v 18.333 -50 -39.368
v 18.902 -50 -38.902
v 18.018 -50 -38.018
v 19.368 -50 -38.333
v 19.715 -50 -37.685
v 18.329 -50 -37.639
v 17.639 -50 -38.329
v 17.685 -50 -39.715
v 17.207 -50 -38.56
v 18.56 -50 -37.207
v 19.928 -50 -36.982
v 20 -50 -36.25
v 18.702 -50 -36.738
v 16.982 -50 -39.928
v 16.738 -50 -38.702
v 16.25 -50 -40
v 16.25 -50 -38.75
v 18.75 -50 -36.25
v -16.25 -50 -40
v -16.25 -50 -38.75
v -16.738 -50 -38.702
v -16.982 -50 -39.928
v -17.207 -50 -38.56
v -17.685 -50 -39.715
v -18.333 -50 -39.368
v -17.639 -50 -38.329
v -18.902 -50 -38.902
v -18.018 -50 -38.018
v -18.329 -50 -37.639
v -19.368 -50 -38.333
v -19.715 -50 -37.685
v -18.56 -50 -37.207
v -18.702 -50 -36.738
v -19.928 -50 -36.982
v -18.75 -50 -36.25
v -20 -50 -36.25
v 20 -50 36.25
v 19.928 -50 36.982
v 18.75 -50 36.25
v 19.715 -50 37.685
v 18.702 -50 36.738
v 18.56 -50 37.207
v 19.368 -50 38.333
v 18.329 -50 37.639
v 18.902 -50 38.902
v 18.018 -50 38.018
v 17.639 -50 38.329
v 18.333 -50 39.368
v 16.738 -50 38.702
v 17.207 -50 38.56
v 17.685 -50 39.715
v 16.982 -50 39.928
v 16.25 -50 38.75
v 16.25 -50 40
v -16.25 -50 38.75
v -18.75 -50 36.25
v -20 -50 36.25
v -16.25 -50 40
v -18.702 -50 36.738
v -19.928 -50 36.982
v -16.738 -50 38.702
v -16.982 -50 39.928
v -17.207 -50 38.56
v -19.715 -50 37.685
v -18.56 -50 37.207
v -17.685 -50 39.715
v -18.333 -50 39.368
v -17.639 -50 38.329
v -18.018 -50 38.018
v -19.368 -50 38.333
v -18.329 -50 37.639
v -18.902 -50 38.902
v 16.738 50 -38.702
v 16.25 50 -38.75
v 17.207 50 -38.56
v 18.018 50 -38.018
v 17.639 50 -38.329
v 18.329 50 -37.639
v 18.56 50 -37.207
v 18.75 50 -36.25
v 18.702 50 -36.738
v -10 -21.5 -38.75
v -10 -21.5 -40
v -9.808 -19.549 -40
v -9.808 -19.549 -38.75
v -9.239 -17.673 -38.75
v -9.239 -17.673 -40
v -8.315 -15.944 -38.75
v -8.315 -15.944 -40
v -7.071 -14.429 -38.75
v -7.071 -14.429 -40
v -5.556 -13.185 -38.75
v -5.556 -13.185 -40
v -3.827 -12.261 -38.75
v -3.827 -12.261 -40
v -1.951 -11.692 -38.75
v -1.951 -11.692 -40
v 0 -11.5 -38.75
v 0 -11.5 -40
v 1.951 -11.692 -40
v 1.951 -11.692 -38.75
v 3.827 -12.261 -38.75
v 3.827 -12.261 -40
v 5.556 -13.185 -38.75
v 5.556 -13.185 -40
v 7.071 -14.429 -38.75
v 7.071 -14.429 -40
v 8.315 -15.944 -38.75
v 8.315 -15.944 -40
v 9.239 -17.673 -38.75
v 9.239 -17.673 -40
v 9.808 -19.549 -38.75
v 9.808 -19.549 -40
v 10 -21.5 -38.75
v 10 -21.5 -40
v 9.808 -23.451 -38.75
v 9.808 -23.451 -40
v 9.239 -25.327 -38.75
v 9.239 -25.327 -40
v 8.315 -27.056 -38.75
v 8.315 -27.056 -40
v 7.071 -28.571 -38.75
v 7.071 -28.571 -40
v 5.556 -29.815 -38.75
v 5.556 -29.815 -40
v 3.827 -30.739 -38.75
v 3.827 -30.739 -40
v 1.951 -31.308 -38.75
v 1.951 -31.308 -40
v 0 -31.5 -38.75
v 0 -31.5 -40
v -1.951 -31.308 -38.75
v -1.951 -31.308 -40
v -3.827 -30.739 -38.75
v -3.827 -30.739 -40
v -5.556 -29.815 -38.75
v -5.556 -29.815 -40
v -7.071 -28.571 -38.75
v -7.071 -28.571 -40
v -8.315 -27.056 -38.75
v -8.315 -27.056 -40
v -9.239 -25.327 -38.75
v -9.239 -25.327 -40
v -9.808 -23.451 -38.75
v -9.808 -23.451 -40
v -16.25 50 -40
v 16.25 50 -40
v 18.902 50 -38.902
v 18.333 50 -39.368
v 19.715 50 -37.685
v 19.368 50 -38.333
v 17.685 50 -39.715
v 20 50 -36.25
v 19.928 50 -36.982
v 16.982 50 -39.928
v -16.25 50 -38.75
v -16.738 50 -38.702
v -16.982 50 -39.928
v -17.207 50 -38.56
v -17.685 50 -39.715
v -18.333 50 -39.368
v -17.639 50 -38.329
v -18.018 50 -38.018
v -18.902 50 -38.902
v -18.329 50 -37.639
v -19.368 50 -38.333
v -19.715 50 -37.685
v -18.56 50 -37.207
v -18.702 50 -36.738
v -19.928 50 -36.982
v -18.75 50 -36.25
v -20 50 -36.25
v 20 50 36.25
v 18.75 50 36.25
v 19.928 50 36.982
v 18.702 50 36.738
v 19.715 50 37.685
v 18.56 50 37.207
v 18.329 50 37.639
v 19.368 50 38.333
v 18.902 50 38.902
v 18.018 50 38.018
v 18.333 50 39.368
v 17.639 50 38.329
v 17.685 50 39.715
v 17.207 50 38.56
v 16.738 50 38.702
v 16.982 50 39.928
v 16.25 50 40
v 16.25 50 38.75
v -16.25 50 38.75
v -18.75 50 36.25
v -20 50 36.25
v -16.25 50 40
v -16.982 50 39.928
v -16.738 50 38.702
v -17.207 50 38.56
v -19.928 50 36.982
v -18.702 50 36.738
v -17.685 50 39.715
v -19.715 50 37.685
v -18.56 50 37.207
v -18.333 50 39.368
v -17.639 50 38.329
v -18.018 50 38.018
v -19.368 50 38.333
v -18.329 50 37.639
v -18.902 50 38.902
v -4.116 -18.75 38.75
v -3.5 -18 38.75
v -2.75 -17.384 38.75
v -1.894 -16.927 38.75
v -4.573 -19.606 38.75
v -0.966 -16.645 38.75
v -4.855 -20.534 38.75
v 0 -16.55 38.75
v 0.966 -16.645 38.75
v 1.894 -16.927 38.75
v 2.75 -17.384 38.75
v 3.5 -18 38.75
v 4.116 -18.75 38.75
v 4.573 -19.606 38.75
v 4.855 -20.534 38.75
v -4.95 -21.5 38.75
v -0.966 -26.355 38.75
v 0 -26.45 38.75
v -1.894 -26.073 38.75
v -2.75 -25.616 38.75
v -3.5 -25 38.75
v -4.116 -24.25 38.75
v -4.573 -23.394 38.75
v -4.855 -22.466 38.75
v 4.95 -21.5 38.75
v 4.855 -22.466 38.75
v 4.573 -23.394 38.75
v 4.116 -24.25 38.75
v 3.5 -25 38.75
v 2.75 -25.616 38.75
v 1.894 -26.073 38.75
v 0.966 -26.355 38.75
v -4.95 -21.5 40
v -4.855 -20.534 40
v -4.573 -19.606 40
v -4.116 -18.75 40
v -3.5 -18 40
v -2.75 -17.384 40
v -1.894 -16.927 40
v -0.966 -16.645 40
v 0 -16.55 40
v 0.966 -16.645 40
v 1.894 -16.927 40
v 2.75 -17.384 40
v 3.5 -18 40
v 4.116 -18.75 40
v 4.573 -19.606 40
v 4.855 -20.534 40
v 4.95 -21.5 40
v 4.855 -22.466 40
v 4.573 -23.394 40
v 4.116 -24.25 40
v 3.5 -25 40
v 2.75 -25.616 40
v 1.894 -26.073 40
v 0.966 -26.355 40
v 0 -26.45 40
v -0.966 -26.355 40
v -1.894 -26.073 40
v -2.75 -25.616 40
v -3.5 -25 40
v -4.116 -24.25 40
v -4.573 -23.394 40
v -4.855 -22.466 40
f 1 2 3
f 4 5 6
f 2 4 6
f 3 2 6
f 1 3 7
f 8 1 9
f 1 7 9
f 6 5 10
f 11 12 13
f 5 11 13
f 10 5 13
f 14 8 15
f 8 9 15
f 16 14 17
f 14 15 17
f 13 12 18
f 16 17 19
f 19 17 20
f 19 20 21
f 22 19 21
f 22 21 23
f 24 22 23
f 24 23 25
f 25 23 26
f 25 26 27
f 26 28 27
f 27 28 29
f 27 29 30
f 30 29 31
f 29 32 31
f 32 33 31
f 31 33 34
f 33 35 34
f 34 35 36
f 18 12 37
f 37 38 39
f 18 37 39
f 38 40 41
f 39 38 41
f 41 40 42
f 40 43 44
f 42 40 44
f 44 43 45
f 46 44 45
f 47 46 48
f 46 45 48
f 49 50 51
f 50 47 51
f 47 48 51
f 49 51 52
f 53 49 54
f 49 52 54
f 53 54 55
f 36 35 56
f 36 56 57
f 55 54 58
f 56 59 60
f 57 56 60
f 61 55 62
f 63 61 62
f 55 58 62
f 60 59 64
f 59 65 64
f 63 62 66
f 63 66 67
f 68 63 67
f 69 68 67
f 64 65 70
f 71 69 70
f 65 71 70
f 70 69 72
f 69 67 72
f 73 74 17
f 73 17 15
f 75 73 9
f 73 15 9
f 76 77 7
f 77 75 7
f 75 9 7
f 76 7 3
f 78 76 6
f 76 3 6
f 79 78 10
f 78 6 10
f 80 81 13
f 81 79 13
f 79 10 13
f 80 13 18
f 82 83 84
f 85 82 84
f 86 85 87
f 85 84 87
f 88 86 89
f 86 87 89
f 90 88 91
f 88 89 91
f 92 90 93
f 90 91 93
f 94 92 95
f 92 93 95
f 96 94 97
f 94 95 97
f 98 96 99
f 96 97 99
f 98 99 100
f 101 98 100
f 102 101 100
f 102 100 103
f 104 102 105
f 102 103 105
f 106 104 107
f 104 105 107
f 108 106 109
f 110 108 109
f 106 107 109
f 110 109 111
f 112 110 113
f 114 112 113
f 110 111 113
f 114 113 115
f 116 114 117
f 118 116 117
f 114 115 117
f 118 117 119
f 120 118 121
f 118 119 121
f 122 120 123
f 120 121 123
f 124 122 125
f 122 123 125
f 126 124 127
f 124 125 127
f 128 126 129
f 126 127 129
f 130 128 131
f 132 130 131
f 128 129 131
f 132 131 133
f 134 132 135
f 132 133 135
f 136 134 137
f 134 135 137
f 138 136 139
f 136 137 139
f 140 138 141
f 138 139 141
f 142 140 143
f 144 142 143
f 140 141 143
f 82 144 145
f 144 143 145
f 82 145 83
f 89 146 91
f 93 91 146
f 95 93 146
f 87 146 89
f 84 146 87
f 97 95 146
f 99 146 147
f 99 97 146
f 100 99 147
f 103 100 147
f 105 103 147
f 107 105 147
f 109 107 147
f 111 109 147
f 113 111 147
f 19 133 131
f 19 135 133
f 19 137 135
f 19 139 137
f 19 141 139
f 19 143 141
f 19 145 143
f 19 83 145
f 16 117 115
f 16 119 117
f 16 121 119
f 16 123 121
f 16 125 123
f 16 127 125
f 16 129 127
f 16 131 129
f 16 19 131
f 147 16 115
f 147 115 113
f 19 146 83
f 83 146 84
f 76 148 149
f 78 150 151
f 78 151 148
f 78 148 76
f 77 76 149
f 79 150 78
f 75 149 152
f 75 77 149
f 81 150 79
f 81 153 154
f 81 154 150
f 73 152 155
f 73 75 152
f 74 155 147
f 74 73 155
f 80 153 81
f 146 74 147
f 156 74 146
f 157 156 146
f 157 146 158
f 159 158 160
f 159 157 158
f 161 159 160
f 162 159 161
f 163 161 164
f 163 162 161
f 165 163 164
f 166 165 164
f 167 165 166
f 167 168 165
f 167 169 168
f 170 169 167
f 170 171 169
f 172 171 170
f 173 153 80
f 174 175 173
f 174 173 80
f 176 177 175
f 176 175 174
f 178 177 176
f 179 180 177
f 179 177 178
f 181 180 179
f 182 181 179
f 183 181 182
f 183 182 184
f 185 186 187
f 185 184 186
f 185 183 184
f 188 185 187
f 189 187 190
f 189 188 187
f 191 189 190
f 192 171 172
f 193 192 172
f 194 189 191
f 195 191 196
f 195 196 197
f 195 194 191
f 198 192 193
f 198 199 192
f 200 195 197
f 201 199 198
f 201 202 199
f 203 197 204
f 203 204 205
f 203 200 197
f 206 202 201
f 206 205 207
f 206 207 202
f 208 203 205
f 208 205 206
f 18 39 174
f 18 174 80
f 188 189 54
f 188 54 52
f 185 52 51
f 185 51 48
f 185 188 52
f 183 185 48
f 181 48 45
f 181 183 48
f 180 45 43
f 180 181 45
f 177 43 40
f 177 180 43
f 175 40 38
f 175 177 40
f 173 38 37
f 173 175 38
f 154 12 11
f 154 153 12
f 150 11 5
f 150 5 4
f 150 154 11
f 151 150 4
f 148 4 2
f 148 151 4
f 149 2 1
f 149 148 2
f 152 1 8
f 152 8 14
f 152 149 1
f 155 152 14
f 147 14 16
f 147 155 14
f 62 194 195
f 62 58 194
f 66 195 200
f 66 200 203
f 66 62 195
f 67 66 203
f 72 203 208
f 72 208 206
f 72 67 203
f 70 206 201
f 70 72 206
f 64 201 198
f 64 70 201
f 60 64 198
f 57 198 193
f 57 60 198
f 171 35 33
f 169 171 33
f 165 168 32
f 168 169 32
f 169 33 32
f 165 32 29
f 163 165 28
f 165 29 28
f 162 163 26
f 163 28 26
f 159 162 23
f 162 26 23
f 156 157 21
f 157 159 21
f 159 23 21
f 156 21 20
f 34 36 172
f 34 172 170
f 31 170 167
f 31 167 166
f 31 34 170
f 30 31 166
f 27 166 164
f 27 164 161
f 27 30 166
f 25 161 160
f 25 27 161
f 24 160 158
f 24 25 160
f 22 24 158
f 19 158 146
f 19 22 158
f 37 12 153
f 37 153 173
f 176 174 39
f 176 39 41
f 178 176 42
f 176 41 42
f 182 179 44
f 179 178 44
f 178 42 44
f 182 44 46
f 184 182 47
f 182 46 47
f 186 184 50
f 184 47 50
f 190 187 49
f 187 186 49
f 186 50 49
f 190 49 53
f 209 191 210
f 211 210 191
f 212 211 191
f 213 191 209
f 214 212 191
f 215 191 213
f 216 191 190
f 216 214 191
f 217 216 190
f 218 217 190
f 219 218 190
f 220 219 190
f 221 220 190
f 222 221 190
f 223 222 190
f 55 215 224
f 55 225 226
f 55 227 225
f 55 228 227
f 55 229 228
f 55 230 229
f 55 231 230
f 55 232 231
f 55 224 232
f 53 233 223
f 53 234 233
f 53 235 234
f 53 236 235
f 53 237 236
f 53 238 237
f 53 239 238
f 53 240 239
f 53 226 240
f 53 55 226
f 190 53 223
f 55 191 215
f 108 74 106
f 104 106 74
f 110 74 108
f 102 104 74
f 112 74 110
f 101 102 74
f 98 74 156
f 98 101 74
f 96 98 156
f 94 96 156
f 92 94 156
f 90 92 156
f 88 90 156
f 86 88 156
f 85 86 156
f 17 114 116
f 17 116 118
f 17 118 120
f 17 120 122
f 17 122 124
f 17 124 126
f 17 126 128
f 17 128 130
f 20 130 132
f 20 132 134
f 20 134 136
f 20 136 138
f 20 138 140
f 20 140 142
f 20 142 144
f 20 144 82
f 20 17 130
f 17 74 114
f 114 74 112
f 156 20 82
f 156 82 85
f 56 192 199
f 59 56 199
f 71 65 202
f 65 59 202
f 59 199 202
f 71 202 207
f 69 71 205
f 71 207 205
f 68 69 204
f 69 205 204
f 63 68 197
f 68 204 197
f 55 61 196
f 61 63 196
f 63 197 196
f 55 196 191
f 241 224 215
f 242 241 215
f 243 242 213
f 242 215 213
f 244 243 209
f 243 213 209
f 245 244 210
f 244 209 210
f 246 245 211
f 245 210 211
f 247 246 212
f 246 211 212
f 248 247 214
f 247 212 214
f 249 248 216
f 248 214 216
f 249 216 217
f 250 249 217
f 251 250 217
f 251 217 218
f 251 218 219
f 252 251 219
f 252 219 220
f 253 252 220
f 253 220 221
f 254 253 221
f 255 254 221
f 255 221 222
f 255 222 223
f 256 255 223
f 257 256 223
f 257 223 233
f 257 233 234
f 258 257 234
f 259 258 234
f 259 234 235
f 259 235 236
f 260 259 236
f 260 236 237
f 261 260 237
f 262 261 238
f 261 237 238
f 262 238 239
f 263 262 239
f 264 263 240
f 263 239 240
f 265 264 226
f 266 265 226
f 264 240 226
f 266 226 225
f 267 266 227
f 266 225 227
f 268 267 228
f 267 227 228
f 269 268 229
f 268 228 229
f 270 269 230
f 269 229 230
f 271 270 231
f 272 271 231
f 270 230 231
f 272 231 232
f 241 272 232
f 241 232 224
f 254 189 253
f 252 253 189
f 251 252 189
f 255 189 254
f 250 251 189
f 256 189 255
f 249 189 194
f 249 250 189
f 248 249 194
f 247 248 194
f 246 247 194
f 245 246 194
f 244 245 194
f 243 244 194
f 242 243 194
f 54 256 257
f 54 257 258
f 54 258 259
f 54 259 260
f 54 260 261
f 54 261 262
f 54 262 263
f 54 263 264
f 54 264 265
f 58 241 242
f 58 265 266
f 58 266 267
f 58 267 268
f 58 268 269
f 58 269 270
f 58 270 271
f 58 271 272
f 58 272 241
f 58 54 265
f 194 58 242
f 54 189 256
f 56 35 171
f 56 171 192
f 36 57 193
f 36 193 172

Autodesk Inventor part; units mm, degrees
ref_plane "YZ Plane" through (0, 0, 0) normal (1, 0, 0) x (0, 1, 0)
ref_plane "XZ Plane" through (0, 0, 0) normal (0, 1, 0) x (-1, 0, 0)
ref_plane "XY Plane" through (0, 0, 0) normal (0, 0, 1) x (1, 0, 0)
sketch "Sketch1" plane through (0, 0, 0) normal (0, 1, 0) x (-1, 0, 0)
  line L0 (-20, 40) -> (20, 40)
  line L1 (20, 40) -> (20, -40)
  line L2 (20, -40) -> (-20, -40)
  line L3 (-20, -40) -> (-20, 40)
  line L4 (-20, 40) -> (20, -40) construction
  line L5 (20, 40) -> (-20, -40) construction
  line L6 (-17.5, 37.5) -> (17.5, -37.5) construction
  line L7 (18.764, 38.7789) -> (-17.2638, -35.6785) construction
  line L8 (18.75, 38.75) -> (-18.75, 38.75)
  line L9 (-18.75, 38.75) -> (-18.75, -38.75)
  line L10 (-18.75, -38.75) -> (18.75, -38.75)
  line L11 (18.75, -38.75) -> (18.75, 38.75)
  line L12 (18.75, 38.75) -> (-18.75, -38.75) construction
  line L13 (-18.75, 38.75) -> (18.75, -38.75) construction
  point P0 (0, 0)
  dimension "d0" = 40
  dimension "d1" = 80
  dimension "d33" = 37.5
  dimension "d34" = 77.5
extrude "Extrusion1" add sketch "Sketch1" along normal mid plane 100
fillet "Fillet1" radius 3.75 4 edges at (20, 0, -40) (20, 0, 40) (-20, 0, -40) (-20, 0, 40)
fillet "Fillet1" radius 2.5 4 edges at (-18.75, 0, -38.75) (18.75, 0, 38.75) (18.75, 0, -38.75) (-18.75, 0, 38.75)
sketch "Sketch2" plane through (16.25, 50, -40) normal (0, 0, -1) x (-1, 0, 0)
  line L0 (32.5, -100) -> (0, -100) projected
  line L1 (16.25, -100) -> (16.25, -71.5)
  circle A0 centre (16.25, -71.5) radius 4.95
  circle A1 centre (16.25, -71.5) radius 10
  point P0 (16.25, -50)
  dimension "d10" = 28.5
  dimension "d11" = 9.9
  dimension "d12" = 20
extrude "Extrusion2" cut sketch "Sketch2" against normal through all contours A0
sketch "Sketch3" plane through (16.25, 50, -40) normal (0, 0, -1) x (-1, 0, 0)
  circle A0 centre (16.25, -71.5) radius 4.95 projected
  circle A1 centre (16.25, -71.5) radius 10
  point P0 (16.25, -50)
  dimension "d15" = 20
extrude "Extrusion3" cut sketch "Sketch3" against normal blind 10
properties part number "tubo1-40x40x640" material "Aluminum"
